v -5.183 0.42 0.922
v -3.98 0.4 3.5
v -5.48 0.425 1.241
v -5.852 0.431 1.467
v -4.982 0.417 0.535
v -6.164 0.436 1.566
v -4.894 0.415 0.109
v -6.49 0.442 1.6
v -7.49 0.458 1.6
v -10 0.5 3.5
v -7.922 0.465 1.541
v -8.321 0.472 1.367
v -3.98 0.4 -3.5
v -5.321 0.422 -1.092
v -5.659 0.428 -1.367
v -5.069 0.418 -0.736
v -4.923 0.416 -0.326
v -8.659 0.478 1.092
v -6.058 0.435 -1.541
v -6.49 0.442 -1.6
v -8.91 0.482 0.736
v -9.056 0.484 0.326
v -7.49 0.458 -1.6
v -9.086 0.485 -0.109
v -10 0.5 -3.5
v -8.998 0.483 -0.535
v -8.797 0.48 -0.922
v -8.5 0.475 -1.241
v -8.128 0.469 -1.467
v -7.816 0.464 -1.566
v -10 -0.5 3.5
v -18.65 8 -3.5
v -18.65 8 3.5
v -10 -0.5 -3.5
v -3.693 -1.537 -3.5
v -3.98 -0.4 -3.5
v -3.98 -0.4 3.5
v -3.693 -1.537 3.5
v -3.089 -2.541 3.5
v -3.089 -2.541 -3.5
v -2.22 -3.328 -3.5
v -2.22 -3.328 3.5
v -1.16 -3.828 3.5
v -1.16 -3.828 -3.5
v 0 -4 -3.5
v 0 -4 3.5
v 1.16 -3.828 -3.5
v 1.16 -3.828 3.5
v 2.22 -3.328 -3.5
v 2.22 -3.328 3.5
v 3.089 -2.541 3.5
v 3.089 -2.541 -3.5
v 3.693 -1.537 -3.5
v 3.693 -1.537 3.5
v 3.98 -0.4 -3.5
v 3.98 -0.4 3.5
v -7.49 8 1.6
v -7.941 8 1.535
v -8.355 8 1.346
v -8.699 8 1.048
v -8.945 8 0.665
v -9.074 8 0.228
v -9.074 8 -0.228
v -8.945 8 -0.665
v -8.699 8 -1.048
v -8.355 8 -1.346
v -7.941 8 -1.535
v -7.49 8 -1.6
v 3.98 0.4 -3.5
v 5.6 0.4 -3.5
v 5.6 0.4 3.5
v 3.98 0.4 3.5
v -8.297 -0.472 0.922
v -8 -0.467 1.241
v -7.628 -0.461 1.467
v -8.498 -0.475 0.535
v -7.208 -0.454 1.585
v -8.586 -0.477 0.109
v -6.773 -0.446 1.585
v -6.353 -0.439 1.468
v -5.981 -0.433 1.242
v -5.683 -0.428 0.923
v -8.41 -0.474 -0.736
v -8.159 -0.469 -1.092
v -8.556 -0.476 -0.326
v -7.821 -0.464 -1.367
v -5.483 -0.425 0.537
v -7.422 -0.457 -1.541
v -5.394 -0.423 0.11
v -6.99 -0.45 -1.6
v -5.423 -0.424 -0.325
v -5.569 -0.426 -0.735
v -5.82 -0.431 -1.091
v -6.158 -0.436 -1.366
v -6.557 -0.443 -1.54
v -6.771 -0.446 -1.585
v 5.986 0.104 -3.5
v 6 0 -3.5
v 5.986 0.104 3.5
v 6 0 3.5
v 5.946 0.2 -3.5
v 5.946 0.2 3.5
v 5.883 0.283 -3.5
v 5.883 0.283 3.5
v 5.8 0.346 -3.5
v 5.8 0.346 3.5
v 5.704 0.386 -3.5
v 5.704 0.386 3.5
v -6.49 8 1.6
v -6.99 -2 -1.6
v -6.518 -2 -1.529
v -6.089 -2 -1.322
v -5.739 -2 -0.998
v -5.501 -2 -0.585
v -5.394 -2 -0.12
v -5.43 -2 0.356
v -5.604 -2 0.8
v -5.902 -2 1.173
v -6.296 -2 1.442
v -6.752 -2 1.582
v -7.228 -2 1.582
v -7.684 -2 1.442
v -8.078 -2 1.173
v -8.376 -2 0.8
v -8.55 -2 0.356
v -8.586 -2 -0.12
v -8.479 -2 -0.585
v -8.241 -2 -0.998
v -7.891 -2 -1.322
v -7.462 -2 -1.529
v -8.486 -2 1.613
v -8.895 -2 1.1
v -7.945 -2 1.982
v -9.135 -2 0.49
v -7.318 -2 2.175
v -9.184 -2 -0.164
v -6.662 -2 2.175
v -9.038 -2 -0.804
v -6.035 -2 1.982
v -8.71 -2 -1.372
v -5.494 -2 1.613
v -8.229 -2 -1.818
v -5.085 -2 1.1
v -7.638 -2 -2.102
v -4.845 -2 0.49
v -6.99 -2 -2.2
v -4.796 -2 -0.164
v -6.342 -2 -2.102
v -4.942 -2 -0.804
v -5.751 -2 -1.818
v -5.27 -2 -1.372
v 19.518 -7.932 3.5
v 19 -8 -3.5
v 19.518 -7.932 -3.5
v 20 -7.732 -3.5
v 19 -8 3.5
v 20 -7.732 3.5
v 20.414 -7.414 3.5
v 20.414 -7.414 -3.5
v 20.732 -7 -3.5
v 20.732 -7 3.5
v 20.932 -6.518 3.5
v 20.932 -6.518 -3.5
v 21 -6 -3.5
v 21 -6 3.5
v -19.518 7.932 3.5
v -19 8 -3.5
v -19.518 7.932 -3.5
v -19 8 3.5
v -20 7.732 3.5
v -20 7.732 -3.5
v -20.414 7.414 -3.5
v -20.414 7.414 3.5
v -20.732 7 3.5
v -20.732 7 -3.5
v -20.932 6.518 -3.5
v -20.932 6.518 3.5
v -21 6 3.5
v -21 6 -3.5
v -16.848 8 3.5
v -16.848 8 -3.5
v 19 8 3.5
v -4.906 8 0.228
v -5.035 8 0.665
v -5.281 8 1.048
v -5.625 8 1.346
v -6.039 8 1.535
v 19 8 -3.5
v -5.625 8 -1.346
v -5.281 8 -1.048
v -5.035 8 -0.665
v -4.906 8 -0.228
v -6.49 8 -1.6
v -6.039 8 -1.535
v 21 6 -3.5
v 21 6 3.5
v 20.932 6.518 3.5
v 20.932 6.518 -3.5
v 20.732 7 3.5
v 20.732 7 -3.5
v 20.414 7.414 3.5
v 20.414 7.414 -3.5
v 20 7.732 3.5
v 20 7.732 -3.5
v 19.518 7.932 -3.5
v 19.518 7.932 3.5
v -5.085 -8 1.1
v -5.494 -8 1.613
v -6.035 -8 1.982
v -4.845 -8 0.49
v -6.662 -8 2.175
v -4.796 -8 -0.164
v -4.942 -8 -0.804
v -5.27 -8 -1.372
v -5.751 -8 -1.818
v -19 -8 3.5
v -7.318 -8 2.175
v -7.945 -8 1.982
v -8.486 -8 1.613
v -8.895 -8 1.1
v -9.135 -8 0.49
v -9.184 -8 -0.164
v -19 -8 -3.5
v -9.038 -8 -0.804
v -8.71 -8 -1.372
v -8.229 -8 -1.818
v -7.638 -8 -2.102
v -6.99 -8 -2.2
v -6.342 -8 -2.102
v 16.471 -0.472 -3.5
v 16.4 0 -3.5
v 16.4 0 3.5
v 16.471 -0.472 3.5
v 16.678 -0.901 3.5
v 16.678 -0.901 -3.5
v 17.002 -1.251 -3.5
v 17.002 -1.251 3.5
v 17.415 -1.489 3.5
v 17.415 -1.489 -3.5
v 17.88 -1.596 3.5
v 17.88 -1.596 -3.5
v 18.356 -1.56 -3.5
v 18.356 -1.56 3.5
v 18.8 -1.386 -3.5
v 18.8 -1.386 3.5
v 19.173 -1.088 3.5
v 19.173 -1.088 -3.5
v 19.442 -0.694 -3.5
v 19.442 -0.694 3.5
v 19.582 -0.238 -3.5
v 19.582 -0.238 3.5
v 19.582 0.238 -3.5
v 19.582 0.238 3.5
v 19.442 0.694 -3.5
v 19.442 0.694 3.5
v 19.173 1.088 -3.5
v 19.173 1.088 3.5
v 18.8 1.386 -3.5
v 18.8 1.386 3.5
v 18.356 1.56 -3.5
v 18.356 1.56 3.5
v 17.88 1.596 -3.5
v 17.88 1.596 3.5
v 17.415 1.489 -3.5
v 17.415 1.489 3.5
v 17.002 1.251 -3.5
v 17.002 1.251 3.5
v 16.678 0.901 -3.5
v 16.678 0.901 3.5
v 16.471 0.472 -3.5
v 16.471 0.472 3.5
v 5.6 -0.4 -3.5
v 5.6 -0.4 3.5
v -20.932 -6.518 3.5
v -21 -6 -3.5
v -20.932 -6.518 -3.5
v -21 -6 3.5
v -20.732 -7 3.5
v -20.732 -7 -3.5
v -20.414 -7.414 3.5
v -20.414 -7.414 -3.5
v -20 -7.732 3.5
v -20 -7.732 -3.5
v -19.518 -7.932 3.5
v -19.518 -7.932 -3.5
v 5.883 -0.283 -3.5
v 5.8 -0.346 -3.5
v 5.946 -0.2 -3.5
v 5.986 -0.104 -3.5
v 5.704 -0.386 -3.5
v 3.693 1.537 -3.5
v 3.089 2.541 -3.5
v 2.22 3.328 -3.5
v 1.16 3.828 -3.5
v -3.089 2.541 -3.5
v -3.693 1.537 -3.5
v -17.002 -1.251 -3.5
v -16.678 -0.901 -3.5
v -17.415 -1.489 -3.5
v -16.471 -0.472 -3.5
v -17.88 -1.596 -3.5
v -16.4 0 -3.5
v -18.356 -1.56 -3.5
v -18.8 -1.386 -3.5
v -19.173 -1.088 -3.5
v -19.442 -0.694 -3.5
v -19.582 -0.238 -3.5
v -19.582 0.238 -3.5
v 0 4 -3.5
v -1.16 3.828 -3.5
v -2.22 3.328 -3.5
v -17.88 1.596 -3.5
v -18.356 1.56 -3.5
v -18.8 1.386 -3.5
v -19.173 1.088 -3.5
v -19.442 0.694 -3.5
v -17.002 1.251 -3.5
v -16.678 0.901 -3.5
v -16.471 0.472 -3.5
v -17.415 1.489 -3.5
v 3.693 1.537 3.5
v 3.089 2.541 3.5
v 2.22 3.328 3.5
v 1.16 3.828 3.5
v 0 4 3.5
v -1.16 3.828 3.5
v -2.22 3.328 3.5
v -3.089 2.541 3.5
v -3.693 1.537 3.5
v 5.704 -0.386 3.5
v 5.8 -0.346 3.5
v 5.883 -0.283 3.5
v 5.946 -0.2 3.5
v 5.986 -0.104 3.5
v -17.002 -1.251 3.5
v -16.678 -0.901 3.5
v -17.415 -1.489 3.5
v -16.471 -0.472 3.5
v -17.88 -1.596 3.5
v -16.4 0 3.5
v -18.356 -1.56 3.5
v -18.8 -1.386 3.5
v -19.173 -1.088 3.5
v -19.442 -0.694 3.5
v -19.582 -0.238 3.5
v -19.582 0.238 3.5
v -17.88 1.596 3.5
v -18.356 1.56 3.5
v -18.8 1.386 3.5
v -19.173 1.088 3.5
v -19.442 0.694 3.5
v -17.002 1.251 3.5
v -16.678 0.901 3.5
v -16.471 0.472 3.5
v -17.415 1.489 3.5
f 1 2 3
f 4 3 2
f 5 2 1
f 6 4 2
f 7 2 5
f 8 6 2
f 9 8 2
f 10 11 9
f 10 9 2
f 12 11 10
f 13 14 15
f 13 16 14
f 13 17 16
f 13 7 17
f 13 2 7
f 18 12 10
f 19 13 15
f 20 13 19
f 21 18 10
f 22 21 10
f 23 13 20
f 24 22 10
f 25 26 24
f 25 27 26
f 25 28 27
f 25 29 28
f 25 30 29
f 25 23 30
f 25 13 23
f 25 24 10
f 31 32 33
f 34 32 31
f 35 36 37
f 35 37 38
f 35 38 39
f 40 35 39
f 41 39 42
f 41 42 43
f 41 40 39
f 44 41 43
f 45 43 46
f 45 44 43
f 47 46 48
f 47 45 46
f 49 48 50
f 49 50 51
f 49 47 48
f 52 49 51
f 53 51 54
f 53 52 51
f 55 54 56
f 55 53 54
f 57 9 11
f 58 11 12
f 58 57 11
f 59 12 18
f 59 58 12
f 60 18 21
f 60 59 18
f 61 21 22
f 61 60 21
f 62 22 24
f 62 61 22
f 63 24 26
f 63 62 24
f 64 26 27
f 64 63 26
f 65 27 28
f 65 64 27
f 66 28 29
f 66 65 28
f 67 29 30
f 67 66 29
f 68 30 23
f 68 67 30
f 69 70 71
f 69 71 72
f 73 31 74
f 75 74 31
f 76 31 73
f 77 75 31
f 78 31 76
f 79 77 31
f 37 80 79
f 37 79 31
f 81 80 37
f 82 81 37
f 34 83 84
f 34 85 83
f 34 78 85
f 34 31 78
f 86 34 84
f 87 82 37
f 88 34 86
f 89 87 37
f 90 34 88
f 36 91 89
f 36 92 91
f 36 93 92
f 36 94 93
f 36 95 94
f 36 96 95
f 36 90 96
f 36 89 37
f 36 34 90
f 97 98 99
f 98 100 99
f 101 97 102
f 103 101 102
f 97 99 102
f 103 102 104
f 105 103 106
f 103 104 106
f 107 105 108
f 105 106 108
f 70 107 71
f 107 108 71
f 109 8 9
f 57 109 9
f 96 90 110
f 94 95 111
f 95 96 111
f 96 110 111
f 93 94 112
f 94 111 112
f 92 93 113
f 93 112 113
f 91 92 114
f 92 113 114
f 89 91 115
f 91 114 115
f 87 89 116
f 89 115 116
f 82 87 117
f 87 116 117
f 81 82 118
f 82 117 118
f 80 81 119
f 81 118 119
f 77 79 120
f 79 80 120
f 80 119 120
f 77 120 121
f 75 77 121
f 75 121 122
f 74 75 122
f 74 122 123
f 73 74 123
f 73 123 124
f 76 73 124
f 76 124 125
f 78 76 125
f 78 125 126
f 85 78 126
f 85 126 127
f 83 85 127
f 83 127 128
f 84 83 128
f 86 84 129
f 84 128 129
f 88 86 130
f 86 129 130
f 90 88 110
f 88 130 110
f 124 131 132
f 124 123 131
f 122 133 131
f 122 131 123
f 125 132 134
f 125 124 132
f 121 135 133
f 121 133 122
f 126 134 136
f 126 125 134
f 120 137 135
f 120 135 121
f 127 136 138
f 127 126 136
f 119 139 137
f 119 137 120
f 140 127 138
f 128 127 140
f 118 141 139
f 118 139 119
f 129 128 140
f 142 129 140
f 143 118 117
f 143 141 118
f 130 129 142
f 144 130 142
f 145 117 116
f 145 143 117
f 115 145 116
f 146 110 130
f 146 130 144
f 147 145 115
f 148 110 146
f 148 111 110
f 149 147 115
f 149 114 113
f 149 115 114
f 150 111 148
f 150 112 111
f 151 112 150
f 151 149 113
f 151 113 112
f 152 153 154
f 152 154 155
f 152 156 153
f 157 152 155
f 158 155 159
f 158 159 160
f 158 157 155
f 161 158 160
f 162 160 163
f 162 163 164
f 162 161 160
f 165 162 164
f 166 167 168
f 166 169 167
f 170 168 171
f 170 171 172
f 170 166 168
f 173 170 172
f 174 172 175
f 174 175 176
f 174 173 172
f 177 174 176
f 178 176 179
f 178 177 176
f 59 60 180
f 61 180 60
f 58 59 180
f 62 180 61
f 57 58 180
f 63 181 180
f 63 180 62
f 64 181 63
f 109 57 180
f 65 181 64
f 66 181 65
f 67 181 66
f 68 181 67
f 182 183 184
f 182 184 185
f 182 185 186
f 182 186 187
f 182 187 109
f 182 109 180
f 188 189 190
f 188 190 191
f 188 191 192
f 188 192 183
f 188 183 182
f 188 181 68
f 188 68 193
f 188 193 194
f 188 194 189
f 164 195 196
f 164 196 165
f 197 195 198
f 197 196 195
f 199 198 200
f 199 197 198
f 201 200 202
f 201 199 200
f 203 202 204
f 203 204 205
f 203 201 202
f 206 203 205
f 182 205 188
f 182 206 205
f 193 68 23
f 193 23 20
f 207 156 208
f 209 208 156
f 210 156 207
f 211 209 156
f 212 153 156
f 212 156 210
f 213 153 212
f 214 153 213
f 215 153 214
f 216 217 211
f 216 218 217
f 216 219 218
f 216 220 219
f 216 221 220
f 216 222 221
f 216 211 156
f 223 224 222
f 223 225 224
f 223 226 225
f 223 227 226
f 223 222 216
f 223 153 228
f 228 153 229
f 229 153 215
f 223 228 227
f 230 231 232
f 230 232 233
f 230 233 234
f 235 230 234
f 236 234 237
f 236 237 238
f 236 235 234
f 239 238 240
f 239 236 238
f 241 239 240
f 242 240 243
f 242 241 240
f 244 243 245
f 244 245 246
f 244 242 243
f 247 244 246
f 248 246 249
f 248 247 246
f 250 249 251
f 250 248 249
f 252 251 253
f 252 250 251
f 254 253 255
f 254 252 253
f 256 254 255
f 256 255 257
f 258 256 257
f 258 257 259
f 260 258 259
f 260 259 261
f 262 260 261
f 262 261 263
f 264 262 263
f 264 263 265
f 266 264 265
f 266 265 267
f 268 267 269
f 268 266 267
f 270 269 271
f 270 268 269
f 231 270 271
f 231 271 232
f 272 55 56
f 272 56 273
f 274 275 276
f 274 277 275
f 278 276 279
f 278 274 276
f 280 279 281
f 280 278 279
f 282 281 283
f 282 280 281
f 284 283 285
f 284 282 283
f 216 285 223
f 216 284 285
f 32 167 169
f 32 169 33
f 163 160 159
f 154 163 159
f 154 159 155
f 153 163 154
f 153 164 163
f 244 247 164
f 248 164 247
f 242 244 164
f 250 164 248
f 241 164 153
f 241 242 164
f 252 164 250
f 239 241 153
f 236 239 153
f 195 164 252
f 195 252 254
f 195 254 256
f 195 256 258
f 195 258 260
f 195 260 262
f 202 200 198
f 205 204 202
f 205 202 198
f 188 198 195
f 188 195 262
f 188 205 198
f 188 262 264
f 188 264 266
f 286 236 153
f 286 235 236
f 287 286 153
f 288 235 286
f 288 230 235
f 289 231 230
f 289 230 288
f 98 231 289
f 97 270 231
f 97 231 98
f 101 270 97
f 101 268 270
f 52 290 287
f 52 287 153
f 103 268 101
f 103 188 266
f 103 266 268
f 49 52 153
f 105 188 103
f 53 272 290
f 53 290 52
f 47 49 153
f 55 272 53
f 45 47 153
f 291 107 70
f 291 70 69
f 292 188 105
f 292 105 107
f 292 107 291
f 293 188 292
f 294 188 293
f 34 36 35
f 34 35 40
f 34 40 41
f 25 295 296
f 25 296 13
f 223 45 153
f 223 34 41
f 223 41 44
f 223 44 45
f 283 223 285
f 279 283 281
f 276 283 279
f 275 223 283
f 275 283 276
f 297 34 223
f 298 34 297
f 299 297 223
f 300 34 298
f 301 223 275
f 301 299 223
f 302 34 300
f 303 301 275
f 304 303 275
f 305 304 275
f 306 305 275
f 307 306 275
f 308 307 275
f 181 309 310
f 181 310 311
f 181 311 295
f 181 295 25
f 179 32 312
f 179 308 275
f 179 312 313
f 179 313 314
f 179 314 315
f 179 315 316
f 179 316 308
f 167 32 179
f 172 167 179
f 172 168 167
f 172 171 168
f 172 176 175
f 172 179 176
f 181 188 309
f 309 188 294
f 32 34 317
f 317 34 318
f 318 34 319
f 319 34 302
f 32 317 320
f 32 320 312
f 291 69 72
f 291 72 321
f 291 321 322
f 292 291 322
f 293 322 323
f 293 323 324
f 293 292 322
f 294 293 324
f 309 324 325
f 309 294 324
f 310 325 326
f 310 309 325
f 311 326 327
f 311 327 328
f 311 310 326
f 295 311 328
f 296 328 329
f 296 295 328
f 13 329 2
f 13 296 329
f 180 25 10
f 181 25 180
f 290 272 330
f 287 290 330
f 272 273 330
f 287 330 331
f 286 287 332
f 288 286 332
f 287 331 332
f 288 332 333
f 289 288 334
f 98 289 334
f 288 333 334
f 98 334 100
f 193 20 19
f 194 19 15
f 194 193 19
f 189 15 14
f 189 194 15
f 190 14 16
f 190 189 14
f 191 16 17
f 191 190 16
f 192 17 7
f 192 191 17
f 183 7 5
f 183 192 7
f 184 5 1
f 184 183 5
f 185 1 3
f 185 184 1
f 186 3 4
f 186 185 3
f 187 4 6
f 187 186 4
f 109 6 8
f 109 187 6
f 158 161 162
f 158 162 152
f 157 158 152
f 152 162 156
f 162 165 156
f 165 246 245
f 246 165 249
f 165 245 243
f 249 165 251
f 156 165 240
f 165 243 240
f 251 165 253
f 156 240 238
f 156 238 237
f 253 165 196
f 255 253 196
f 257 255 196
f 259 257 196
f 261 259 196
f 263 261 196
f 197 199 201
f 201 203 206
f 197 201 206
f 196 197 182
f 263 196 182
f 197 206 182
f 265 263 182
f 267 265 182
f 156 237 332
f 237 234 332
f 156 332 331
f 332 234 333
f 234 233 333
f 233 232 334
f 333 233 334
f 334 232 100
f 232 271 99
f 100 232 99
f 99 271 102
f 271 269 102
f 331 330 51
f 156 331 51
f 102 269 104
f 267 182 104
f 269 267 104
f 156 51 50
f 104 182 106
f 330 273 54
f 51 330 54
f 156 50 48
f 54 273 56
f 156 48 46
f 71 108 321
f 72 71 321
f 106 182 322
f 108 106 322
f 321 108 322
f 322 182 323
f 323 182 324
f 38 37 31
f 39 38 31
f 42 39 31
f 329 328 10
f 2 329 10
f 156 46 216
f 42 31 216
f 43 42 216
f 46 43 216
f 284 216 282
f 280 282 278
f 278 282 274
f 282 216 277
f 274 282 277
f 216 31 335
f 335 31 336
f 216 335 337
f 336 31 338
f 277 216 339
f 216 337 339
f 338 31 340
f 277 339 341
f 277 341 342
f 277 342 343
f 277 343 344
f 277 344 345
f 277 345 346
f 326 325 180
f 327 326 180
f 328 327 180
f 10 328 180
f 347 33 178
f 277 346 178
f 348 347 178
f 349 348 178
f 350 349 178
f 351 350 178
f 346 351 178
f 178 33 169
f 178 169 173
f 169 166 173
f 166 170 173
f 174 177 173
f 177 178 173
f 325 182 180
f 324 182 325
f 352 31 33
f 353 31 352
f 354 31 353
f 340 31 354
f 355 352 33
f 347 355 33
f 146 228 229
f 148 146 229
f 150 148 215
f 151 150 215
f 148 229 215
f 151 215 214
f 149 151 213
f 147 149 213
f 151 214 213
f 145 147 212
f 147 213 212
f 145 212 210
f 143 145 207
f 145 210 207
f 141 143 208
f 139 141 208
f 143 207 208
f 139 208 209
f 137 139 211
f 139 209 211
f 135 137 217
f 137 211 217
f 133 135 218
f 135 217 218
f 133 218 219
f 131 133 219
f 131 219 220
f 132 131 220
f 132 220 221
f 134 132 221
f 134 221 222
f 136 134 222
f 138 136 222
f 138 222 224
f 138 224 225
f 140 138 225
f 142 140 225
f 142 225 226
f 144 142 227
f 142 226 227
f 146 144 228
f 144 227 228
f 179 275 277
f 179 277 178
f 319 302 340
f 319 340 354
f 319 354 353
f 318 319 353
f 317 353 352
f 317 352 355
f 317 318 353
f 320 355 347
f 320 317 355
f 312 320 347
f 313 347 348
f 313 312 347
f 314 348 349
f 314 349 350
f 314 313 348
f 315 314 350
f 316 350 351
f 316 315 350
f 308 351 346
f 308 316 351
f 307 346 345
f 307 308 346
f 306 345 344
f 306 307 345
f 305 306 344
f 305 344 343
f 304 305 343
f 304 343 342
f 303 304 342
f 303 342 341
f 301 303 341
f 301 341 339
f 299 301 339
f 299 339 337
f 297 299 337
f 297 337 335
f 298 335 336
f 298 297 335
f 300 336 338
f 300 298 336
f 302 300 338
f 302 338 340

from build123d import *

# Parameters (mm, degrees)
BOSS_EXTRUDE1_DEPTH      = 3.5
BOSS_EXTRUDE1_DEPTH_BACK = 3.5
SKETCH1_R                = 1.6
CUT_EXTRUDE1_REACH       = 28.632
SKETCH3_R                = 1.6
SKETCH3_3_R              = 2.2
SKETCH3_3_R_2            = 1.6
CUT_EXTRUDE2_DEPTH       = 6
CUT_EXTRUDE3_REACH       = 28.632
FILLET1_R                = 2
FILLET2_R                = 0.4


with BuildPart() as part:
    # Sketch1 → Boss-Extrude1 (new, two sides: drawn at the far end of the back side and taken through both)
    with BuildSketch(Plane.XY.offset(-BOSS_EXTRUDE1_DEPTH_BACK)):
        with BuildLine():
            Line((-21, 8), (-18.64966284, 8))
            Line((-18.64966284, 8), (-10, -0.5))
            Line((-10, -0.5), (-3.979949748, -0.4))
            ThreePointArc((-3.979949748, -0.4), (0, -4), (3.979949748, -0.4))
            Line((3.979949748, -0.4), (6, -0.4))
            Line((6, -0.4), (6, 0.4))
            Line((6, 0.4), (3.979949748, 0.4))
            ThreePointArc((3.979949748, 0.4), (0, 4), (-3.979949748, 0.4))
            Line((-3.979949748, 0.4), (-10, 0.5))
            Line((-10, 0.5), (-16.848441102, 8))
            Line((-16.848441102, 8), (21, 8))
            Line((21, 8), (21, -8))
            Line((21, -8), (-21, -8))
            Line((-21, -8), (-21, 8))
        make_face()
        with Locations((-18, 0)):
            Circle(SKETCH1_R, mode=Mode.SUBTRACT)
        with Locations(Location((18, 0, 0), (0, 0, 180))):
            Circle(SKETCH1_R, mode=Mode.SUBTRACT)
    extrude(amount=BOSS_EXTRUDE1_DEPTH + BOSS_EXTRUDE1_DEPTH_BACK)

    # Cut-Extrude1: up to this plane
    cut_extrude1_end = Plane(origin=(-10, -0.5, -3.5), z_dir=(-0.016608865731892127, 0.9998620632762801, 0))
    # Sketch3 → Cut-Extrude1 (cut, up to the surface)
    with BuildSketch(Plane.XZ.offset(8), mode=Mode.PRIVATE) as cut_extrude1_sk1:
        with Locations(Location((-6.989974874, 0, 0), (0, 0, 270))):
            Circle(SKETCH3_R)
    cut_extrude1_tool1 = split(extrude(cut_extrude1_sk1.sketch, amount=-CUT_EXTRUDE1_REACH, mode=Mode.PRIVATE), bisect_by=cut_extrude1_end, keep=Keep.BOTH, mode=Mode.PRIVATE)
    add(cut_extrude1_tool1.solids().sort_by_distance((-6.989975, -8, 0))[0], mode=Mode.SUBTRACT)

    # Sketch3<3> → Cut-Extrude2 (cut)
    with BuildSketch(Plane.XZ.offset(8)):
        with Locations(Location((-6.989974874, 0, 0), (0, 0, 270))):
            Circle(SKETCH3_3_R)
        with Locations(Location((-6.989974874, 0, 0), (0, 0, 270))):
            Circle(SKETCH3_3_R_2, mode=Mode.SUBTRACT)
    extrude(amount=-CUT_EXTRUDE2_DEPTH, mode=Mode.SUBTRACT)

    # Cut-Extrude3: up to this plane
    cut_extrude3_end = Plane(origin=(-10, 0.5, -3.5), z_dir=(-0.016608865731892127, -0.9998620632762801, 0))
    # Sketch4 → Cut-Extrude3 (cut, up to the surface)
    with BuildSketch(Plane(origin=(0, 8, 0), x_dir=(1, 0, 0), z_dir=(0, 1, 0)), mode=Mode.PRIVATE) as cut_extrude3_sk1:
        with BuildLine():
            Line((-7.489974874, 1.6), (-6.489974874, 1.6))
            ThreePointArc((-6.489974874, 1.6), (-4.889974874, 0), (-6.489974874, -1.6))
            Line((-6.489974874, -1.6), (-7.489974874, -1.6))
            ThreePointArc((-7.489974874, -1.6), (-9.089974874, 0), (-7.489974874, 1.6))
        make_face()
    cut_extrude3_tool1 = split(extrude(cut_extrude3_sk1.sketch, amount=-CUT_EXTRUDE3_REACH, mode=Mode.PRIVATE), bisect_by=cut_extrude3_end, keep=Keep.BOTH, mode=Mode.PRIVATE)
    add(cut_extrude3_tool1.solids().sort_by_distance((-6.989975, 8, 0))[0], mode=Mode.SUBTRACT)

    # Fillet1
    fillet1_edges = [part.edges().sort_by_distance(p)[0] for p in [
        (21, 8, 0),
        (21, -8, 0),
        (-21, -8, 0),
        (-21, 8, 0),
    ]]
    fillet(fillet1_edges, radius=FILLET1_R)

    # Fillet2
    fillet2_edges = [part.edges().sort_by_distance(p)[0] for p in [
        (6, -0.4, 0),
        (6, 0.4, 0),
    ]]
    fillet(fillet2_edges, radius=FILLET2_R - 0.0001)  # a hair under: the kernel refuses the full size


solid = part.part
